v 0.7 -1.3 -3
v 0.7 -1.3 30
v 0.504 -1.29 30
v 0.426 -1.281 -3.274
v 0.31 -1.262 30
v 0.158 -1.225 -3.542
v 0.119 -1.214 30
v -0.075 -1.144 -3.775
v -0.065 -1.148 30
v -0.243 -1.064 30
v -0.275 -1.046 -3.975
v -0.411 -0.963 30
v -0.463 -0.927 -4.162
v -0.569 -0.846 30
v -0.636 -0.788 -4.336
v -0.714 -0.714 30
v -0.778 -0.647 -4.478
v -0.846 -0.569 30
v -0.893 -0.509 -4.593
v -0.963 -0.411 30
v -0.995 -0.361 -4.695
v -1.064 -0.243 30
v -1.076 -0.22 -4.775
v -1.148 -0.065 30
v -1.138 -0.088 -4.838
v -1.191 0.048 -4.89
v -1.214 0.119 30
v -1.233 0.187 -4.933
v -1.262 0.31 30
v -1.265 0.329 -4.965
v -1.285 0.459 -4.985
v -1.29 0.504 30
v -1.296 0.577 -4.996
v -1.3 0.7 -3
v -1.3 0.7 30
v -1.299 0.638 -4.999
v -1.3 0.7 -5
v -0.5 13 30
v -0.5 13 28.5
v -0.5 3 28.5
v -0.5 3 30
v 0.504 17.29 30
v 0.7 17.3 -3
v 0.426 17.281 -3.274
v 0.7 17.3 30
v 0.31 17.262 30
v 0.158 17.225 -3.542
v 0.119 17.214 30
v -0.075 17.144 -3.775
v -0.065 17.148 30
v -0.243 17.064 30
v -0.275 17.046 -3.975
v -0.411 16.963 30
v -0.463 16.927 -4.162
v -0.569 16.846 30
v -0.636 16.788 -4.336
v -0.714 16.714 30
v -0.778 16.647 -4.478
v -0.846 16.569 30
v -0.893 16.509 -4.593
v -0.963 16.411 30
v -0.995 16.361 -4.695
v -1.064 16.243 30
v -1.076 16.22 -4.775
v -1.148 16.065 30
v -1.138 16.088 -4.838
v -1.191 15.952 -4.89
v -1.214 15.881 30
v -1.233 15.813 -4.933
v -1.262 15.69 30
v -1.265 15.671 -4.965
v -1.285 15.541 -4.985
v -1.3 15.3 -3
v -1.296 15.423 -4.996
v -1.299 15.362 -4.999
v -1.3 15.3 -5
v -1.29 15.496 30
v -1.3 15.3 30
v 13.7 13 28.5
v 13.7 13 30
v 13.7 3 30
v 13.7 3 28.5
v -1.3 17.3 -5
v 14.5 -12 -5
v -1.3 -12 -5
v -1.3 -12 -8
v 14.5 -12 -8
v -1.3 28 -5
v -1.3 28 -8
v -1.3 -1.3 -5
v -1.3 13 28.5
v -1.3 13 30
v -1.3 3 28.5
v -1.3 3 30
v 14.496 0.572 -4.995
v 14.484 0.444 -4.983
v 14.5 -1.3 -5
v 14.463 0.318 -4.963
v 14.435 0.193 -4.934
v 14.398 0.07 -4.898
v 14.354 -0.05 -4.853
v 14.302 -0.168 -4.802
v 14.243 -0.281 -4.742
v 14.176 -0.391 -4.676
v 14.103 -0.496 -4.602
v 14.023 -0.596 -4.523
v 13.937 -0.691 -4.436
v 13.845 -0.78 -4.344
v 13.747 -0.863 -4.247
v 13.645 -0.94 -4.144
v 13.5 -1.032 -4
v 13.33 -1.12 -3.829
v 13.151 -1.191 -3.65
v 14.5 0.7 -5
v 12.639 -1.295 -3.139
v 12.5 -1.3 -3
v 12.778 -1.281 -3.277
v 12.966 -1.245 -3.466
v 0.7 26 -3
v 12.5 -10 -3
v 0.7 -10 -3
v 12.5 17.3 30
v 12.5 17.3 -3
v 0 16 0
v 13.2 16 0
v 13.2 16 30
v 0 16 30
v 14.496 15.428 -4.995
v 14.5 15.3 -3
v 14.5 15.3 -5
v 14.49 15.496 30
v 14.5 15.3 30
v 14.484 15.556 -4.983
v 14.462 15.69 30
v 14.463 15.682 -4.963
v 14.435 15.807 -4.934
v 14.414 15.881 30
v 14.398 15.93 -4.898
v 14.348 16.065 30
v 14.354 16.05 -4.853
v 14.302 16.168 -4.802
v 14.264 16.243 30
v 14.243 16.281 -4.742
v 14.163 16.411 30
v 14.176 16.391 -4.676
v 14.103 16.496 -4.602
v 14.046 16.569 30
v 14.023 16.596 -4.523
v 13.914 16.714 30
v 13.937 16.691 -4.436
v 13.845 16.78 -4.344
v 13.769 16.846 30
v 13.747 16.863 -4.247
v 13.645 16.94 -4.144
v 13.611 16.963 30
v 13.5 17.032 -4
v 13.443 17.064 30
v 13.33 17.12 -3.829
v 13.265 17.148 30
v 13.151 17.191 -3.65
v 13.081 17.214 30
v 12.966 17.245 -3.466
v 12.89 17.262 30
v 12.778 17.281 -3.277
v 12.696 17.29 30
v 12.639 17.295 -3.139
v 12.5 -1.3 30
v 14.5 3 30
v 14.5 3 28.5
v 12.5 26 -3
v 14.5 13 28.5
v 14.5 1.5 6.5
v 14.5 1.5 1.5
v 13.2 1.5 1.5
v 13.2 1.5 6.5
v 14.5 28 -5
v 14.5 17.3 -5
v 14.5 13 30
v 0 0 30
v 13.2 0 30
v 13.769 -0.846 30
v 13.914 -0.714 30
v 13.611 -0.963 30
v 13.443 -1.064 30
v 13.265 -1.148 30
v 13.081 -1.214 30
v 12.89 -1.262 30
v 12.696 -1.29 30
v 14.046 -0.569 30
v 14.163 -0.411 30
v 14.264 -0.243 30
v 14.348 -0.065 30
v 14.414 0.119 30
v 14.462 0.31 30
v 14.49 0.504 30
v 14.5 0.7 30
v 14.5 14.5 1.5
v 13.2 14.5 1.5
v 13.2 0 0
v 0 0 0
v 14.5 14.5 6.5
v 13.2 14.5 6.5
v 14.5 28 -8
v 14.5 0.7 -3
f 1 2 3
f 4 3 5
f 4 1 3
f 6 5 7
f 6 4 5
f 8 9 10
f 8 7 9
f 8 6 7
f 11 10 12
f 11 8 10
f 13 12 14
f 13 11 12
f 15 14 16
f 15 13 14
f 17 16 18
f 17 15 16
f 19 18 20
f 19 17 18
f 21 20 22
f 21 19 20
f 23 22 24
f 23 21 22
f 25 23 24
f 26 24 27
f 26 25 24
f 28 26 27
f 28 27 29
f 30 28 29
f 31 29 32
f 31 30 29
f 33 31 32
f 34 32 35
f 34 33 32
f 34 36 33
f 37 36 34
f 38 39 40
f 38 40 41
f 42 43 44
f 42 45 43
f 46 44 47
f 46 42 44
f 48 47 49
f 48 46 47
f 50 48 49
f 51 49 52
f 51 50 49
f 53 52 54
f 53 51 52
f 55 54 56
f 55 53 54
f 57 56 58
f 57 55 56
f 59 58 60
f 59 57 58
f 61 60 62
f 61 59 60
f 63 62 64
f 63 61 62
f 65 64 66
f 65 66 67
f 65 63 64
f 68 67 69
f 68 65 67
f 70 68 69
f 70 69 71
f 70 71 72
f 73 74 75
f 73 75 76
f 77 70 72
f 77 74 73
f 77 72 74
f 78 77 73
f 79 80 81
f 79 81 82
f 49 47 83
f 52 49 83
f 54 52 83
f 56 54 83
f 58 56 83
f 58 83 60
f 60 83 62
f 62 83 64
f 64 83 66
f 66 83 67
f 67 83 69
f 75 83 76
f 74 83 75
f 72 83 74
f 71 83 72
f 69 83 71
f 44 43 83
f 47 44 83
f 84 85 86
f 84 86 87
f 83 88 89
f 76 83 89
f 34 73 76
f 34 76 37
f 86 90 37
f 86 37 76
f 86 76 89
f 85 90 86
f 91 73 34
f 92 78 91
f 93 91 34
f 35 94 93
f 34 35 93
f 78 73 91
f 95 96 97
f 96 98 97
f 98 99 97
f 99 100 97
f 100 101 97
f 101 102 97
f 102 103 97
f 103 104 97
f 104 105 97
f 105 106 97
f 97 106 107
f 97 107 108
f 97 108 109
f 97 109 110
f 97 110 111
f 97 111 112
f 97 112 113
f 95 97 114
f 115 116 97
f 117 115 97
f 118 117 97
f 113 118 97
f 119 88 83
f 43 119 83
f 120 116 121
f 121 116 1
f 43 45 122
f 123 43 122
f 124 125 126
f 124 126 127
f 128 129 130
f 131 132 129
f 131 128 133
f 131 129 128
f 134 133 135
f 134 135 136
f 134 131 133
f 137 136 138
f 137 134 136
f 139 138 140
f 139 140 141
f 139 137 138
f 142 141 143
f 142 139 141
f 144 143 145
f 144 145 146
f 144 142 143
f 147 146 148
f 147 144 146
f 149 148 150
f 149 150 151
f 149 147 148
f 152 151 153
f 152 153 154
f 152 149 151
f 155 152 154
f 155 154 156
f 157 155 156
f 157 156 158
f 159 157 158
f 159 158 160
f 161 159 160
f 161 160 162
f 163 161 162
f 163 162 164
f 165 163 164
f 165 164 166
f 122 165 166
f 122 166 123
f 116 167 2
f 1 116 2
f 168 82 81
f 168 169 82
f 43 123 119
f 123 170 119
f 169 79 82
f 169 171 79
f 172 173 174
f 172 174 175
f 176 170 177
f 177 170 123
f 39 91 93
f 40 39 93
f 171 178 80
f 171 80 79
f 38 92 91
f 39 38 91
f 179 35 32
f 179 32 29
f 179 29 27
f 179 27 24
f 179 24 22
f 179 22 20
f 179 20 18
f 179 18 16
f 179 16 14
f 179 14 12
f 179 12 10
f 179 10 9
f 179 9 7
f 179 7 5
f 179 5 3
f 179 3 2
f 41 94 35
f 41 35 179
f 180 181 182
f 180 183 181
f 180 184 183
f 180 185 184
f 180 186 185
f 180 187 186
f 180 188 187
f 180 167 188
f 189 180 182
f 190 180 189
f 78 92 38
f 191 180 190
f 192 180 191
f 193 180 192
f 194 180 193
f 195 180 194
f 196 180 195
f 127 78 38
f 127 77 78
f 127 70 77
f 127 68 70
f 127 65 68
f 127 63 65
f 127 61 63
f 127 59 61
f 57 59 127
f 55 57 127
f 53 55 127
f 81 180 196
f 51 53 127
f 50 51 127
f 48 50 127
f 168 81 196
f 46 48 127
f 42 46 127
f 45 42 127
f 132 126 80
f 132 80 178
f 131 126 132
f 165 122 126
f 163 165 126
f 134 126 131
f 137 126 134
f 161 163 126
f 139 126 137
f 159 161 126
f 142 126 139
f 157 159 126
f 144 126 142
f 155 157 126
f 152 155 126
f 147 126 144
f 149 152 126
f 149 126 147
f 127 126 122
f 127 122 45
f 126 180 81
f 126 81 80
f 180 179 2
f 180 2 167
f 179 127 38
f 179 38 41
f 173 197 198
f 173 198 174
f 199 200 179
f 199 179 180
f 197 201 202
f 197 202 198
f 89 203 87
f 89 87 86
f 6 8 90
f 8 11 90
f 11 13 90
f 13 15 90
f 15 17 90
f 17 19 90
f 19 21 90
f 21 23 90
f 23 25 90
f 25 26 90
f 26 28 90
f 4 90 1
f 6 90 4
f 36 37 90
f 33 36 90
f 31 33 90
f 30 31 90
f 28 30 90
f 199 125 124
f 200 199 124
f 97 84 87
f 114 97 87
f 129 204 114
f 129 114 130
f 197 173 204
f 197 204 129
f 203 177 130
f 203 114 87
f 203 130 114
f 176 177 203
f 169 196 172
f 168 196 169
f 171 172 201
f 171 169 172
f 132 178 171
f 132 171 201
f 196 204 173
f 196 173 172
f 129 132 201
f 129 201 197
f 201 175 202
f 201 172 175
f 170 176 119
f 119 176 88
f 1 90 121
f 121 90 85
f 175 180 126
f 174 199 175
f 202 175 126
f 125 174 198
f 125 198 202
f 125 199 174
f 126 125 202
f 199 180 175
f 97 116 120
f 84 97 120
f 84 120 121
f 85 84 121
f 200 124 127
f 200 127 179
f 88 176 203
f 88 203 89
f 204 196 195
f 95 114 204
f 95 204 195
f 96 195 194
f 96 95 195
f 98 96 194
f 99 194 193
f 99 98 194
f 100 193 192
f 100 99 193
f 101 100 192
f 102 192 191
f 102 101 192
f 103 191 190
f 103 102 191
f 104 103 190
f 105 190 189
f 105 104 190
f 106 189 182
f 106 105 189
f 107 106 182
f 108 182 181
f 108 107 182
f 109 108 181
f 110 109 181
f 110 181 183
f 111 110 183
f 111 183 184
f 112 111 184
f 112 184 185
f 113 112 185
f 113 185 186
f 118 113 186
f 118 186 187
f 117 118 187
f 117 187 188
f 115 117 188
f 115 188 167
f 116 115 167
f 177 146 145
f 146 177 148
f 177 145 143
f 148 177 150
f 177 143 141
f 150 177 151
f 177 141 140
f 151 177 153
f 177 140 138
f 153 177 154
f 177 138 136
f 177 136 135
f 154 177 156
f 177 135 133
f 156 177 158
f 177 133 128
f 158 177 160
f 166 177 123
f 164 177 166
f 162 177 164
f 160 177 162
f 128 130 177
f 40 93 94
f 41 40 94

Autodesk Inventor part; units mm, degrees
ref_plane "YZ Plane" through (0, 0, 0) normal (1, 0, 0) x (0, 1, 0)
ref_plane "XZ Plane" through (0, 0, 0) normal (0, 1, 0) x (-1, 0, 0)
sketch "Sketch1" plane through (0, 0, 0) normal (0, 0, 1) x (1, 0, 0)
  point P0 (0, 0)
sketch "Sketch2" plane through (0, 0, 0) normal (0, 0, 1) x (1, 0, 0)
  line L0 (0, 0) -> (13.2, 0)
  line L1 (13.2, 0) -> (13.2, 16)
  line L2 (13.2, 16) -> (0, 16)
  line L3 (0, 16) -> (0, 0)
  line L4 (14.5, 17.3) -> (14.5, -1.3)
  line L5 (14.5, -1.3) -> (-1.3, -1.3)
  line L6 (-1.3, -1.3) -> (-1.3, 17.3)
  line L7 (-1.3, 17.3) -> (14.5, 17.3)
  dimension "d0" = 13.2
  dimension "d1" = 16
  dimension "d2" = 1.3
extrude "Extrusion1" add sketch "Sketch2" along normal blind 30
sketch "Sketch3" plane through (0, 0, 0) normal (0, 0, -1) x (-1, 0, 0)
  line L0 (-14.5, -1.3) -> (-14.5, 17.3) projected
  line L1 (1.3, 17.3) -> (1.3, -1.3) projected
  line L2 (-14.5, 17.3) -> (1.3, 17.3) projected
  line L3 (1.3, -1.3) -> (-14.5, -1.3) projected
  line L4 (1.3, 17.3) -> (-14.5, 17.3)
  line L5 (-14.5, 17.3) -> (-14.5, 25.3)
  line L6 (-14.5, 25.3) -> (1.3, 25.3)
  line L7 (1.3, 25.3) -> (1.3, 17.3)
  line L8 (1.3, -1.3) -> (-14.5, -1.3)
  line L9 (-14.5, -1.3) -> (-14.5, -9.3)
  line L10 (-14.5, -9.3) -> (1.3, -9.3)
  line L11 (1.3, -9.3) -> (1.3, -1.3)
  point P0 (0, 0)
  dimension "d27" = 8
  dimension "d28" = 8
extrude "Extrusion2" add sketch "Sketch3" along normal blind 3 contours L0 L2 L1 L3
sketch "Sketch5" plane through (14.5, -1.3, 30) normal (1, 0, 0) x (0, 0, -1)
  line L0 (28.5, 2.8) -> (23.5, 2.8)
  line L1 (23.5, 2.8) -> (23.5, 15.8)
  line L2 (23.5, 15.8) -> (28.5, 15.8)
  line L3 (28.5, 15.8) -> (28.5, 2.8)
  line L4 (33, 0) -> (0, 0) projected
  line L5 (33, 18.6) -> (33, 0) projected
  point P0 (30, 1.3)
  point P1 (30, 0)
  dimension "d14" = 13
  dimension "d15" = 5
  dimension "d16" = 2.8
  dimension "d17" = 4.5
extrude "Extrusion4" cut sketch "Sketch5" against normal blind 1.3
sketch "Sketch6" plane through (-1.3, -1.3, 30) normal (-1, 0, 0) x (0, 0, 1)
  line L0 (0, 17.3) -> (0, 1.3) projected
  line L1 (0, 14.3) -> (-1.5, 14.3)
  line L2 (-1.5, 14.3) -> (-1.5, 4.3)
  line L3 (-1.5, 4.3) -> (0, 4.3)
  line L4 (0, 4.3) -> (0, 14.3)
  line L5 (0, 18.6) -> (-33, 18.6) projected
  point P0 (-30, 1.3)
  point P1 (0, 4.3)
  dimension "d20" = 10
  dimension "d21" = 1.5
  dimension "d30" = 4.3
sketch "Sketch7" plane through (14.5, -1.3, 30) normal (1, 0, 0) x (0, 0, -1)
  line L0 (1.5, 14.3) -> (1.5, 4.3) projected
  line L1 (0, 14.3) -> (1.5, 14.3) projected
  line L2 (1.5, 4.3) -> (0, 4.3) projected
  line L3 (0, 14.3) -> (0, 4.3)
  line L4 (0, 18.6) -> (0, 0) projected
  point P0 (30, 1.3)
  point P1 (0, 14.3)
ref_plane "Work Plane1" through (6.6, -1.3, -3) normal (1, 0, 0) x (0, 0, -1)
extrude "Extrusion7" cut sketch "Sketch7" against normal blind 0.8
extrude "Extrusion8" cut sketch "Sketch6" against normal blind 0.8
sketch "Sketch8" plane through (0, 0, -3) normal (0, 0, -1) x (-1, 0, 0)
  line L0 (-14.5, 28) -> (1.3, 28)
  line L1 (1.3, 28) -> (1.3, -12)
  line L2 (1.3, -12) -> (-14.5, -12)
  line L3 (-14.5, -12) -> (-14.5, 28)
  line L4 (1.3, 17.3) -> (-14.5, 17.3) projected
  line L5 (-14.5, -1.3) -> (1.3, -1.3) projected
  line L6 (-14.5, 17.3) -> (1.3, 17.3) projected
  line L7 (-14.5, 17.3) -> (-14.5, -1.3) projected
  line L8 (1.3, -1.3) -> (1.3, 17.3) projected
  line L9 (-14.5, 8) -> (1.3, 8) construction
  point P0 (0, 0)
  dimension "d39" = 40
  dimension "d40" = 20
extrude "Extrusion9" add sketch "Sketch8" along normal blind 5
fillet "Fillet2" radius 2 4 edges at (14.5, 17.3, 13.5) (-1.3, 17.3, 13.5) (14.5, -1.3, 13.5) (-1.3, -1.3, 13.5)
chamfer "Chamfer1" distance 2 angle 45 6 edges at (-1.3, 16.3, -3) (14.5, 16.3, -3) (-1.3, -0.3, -3) (14.5, -0.3, -3) (6.6, -12, -3) (6.6, 28, -3)
properties part number "VL53L0X_case"
